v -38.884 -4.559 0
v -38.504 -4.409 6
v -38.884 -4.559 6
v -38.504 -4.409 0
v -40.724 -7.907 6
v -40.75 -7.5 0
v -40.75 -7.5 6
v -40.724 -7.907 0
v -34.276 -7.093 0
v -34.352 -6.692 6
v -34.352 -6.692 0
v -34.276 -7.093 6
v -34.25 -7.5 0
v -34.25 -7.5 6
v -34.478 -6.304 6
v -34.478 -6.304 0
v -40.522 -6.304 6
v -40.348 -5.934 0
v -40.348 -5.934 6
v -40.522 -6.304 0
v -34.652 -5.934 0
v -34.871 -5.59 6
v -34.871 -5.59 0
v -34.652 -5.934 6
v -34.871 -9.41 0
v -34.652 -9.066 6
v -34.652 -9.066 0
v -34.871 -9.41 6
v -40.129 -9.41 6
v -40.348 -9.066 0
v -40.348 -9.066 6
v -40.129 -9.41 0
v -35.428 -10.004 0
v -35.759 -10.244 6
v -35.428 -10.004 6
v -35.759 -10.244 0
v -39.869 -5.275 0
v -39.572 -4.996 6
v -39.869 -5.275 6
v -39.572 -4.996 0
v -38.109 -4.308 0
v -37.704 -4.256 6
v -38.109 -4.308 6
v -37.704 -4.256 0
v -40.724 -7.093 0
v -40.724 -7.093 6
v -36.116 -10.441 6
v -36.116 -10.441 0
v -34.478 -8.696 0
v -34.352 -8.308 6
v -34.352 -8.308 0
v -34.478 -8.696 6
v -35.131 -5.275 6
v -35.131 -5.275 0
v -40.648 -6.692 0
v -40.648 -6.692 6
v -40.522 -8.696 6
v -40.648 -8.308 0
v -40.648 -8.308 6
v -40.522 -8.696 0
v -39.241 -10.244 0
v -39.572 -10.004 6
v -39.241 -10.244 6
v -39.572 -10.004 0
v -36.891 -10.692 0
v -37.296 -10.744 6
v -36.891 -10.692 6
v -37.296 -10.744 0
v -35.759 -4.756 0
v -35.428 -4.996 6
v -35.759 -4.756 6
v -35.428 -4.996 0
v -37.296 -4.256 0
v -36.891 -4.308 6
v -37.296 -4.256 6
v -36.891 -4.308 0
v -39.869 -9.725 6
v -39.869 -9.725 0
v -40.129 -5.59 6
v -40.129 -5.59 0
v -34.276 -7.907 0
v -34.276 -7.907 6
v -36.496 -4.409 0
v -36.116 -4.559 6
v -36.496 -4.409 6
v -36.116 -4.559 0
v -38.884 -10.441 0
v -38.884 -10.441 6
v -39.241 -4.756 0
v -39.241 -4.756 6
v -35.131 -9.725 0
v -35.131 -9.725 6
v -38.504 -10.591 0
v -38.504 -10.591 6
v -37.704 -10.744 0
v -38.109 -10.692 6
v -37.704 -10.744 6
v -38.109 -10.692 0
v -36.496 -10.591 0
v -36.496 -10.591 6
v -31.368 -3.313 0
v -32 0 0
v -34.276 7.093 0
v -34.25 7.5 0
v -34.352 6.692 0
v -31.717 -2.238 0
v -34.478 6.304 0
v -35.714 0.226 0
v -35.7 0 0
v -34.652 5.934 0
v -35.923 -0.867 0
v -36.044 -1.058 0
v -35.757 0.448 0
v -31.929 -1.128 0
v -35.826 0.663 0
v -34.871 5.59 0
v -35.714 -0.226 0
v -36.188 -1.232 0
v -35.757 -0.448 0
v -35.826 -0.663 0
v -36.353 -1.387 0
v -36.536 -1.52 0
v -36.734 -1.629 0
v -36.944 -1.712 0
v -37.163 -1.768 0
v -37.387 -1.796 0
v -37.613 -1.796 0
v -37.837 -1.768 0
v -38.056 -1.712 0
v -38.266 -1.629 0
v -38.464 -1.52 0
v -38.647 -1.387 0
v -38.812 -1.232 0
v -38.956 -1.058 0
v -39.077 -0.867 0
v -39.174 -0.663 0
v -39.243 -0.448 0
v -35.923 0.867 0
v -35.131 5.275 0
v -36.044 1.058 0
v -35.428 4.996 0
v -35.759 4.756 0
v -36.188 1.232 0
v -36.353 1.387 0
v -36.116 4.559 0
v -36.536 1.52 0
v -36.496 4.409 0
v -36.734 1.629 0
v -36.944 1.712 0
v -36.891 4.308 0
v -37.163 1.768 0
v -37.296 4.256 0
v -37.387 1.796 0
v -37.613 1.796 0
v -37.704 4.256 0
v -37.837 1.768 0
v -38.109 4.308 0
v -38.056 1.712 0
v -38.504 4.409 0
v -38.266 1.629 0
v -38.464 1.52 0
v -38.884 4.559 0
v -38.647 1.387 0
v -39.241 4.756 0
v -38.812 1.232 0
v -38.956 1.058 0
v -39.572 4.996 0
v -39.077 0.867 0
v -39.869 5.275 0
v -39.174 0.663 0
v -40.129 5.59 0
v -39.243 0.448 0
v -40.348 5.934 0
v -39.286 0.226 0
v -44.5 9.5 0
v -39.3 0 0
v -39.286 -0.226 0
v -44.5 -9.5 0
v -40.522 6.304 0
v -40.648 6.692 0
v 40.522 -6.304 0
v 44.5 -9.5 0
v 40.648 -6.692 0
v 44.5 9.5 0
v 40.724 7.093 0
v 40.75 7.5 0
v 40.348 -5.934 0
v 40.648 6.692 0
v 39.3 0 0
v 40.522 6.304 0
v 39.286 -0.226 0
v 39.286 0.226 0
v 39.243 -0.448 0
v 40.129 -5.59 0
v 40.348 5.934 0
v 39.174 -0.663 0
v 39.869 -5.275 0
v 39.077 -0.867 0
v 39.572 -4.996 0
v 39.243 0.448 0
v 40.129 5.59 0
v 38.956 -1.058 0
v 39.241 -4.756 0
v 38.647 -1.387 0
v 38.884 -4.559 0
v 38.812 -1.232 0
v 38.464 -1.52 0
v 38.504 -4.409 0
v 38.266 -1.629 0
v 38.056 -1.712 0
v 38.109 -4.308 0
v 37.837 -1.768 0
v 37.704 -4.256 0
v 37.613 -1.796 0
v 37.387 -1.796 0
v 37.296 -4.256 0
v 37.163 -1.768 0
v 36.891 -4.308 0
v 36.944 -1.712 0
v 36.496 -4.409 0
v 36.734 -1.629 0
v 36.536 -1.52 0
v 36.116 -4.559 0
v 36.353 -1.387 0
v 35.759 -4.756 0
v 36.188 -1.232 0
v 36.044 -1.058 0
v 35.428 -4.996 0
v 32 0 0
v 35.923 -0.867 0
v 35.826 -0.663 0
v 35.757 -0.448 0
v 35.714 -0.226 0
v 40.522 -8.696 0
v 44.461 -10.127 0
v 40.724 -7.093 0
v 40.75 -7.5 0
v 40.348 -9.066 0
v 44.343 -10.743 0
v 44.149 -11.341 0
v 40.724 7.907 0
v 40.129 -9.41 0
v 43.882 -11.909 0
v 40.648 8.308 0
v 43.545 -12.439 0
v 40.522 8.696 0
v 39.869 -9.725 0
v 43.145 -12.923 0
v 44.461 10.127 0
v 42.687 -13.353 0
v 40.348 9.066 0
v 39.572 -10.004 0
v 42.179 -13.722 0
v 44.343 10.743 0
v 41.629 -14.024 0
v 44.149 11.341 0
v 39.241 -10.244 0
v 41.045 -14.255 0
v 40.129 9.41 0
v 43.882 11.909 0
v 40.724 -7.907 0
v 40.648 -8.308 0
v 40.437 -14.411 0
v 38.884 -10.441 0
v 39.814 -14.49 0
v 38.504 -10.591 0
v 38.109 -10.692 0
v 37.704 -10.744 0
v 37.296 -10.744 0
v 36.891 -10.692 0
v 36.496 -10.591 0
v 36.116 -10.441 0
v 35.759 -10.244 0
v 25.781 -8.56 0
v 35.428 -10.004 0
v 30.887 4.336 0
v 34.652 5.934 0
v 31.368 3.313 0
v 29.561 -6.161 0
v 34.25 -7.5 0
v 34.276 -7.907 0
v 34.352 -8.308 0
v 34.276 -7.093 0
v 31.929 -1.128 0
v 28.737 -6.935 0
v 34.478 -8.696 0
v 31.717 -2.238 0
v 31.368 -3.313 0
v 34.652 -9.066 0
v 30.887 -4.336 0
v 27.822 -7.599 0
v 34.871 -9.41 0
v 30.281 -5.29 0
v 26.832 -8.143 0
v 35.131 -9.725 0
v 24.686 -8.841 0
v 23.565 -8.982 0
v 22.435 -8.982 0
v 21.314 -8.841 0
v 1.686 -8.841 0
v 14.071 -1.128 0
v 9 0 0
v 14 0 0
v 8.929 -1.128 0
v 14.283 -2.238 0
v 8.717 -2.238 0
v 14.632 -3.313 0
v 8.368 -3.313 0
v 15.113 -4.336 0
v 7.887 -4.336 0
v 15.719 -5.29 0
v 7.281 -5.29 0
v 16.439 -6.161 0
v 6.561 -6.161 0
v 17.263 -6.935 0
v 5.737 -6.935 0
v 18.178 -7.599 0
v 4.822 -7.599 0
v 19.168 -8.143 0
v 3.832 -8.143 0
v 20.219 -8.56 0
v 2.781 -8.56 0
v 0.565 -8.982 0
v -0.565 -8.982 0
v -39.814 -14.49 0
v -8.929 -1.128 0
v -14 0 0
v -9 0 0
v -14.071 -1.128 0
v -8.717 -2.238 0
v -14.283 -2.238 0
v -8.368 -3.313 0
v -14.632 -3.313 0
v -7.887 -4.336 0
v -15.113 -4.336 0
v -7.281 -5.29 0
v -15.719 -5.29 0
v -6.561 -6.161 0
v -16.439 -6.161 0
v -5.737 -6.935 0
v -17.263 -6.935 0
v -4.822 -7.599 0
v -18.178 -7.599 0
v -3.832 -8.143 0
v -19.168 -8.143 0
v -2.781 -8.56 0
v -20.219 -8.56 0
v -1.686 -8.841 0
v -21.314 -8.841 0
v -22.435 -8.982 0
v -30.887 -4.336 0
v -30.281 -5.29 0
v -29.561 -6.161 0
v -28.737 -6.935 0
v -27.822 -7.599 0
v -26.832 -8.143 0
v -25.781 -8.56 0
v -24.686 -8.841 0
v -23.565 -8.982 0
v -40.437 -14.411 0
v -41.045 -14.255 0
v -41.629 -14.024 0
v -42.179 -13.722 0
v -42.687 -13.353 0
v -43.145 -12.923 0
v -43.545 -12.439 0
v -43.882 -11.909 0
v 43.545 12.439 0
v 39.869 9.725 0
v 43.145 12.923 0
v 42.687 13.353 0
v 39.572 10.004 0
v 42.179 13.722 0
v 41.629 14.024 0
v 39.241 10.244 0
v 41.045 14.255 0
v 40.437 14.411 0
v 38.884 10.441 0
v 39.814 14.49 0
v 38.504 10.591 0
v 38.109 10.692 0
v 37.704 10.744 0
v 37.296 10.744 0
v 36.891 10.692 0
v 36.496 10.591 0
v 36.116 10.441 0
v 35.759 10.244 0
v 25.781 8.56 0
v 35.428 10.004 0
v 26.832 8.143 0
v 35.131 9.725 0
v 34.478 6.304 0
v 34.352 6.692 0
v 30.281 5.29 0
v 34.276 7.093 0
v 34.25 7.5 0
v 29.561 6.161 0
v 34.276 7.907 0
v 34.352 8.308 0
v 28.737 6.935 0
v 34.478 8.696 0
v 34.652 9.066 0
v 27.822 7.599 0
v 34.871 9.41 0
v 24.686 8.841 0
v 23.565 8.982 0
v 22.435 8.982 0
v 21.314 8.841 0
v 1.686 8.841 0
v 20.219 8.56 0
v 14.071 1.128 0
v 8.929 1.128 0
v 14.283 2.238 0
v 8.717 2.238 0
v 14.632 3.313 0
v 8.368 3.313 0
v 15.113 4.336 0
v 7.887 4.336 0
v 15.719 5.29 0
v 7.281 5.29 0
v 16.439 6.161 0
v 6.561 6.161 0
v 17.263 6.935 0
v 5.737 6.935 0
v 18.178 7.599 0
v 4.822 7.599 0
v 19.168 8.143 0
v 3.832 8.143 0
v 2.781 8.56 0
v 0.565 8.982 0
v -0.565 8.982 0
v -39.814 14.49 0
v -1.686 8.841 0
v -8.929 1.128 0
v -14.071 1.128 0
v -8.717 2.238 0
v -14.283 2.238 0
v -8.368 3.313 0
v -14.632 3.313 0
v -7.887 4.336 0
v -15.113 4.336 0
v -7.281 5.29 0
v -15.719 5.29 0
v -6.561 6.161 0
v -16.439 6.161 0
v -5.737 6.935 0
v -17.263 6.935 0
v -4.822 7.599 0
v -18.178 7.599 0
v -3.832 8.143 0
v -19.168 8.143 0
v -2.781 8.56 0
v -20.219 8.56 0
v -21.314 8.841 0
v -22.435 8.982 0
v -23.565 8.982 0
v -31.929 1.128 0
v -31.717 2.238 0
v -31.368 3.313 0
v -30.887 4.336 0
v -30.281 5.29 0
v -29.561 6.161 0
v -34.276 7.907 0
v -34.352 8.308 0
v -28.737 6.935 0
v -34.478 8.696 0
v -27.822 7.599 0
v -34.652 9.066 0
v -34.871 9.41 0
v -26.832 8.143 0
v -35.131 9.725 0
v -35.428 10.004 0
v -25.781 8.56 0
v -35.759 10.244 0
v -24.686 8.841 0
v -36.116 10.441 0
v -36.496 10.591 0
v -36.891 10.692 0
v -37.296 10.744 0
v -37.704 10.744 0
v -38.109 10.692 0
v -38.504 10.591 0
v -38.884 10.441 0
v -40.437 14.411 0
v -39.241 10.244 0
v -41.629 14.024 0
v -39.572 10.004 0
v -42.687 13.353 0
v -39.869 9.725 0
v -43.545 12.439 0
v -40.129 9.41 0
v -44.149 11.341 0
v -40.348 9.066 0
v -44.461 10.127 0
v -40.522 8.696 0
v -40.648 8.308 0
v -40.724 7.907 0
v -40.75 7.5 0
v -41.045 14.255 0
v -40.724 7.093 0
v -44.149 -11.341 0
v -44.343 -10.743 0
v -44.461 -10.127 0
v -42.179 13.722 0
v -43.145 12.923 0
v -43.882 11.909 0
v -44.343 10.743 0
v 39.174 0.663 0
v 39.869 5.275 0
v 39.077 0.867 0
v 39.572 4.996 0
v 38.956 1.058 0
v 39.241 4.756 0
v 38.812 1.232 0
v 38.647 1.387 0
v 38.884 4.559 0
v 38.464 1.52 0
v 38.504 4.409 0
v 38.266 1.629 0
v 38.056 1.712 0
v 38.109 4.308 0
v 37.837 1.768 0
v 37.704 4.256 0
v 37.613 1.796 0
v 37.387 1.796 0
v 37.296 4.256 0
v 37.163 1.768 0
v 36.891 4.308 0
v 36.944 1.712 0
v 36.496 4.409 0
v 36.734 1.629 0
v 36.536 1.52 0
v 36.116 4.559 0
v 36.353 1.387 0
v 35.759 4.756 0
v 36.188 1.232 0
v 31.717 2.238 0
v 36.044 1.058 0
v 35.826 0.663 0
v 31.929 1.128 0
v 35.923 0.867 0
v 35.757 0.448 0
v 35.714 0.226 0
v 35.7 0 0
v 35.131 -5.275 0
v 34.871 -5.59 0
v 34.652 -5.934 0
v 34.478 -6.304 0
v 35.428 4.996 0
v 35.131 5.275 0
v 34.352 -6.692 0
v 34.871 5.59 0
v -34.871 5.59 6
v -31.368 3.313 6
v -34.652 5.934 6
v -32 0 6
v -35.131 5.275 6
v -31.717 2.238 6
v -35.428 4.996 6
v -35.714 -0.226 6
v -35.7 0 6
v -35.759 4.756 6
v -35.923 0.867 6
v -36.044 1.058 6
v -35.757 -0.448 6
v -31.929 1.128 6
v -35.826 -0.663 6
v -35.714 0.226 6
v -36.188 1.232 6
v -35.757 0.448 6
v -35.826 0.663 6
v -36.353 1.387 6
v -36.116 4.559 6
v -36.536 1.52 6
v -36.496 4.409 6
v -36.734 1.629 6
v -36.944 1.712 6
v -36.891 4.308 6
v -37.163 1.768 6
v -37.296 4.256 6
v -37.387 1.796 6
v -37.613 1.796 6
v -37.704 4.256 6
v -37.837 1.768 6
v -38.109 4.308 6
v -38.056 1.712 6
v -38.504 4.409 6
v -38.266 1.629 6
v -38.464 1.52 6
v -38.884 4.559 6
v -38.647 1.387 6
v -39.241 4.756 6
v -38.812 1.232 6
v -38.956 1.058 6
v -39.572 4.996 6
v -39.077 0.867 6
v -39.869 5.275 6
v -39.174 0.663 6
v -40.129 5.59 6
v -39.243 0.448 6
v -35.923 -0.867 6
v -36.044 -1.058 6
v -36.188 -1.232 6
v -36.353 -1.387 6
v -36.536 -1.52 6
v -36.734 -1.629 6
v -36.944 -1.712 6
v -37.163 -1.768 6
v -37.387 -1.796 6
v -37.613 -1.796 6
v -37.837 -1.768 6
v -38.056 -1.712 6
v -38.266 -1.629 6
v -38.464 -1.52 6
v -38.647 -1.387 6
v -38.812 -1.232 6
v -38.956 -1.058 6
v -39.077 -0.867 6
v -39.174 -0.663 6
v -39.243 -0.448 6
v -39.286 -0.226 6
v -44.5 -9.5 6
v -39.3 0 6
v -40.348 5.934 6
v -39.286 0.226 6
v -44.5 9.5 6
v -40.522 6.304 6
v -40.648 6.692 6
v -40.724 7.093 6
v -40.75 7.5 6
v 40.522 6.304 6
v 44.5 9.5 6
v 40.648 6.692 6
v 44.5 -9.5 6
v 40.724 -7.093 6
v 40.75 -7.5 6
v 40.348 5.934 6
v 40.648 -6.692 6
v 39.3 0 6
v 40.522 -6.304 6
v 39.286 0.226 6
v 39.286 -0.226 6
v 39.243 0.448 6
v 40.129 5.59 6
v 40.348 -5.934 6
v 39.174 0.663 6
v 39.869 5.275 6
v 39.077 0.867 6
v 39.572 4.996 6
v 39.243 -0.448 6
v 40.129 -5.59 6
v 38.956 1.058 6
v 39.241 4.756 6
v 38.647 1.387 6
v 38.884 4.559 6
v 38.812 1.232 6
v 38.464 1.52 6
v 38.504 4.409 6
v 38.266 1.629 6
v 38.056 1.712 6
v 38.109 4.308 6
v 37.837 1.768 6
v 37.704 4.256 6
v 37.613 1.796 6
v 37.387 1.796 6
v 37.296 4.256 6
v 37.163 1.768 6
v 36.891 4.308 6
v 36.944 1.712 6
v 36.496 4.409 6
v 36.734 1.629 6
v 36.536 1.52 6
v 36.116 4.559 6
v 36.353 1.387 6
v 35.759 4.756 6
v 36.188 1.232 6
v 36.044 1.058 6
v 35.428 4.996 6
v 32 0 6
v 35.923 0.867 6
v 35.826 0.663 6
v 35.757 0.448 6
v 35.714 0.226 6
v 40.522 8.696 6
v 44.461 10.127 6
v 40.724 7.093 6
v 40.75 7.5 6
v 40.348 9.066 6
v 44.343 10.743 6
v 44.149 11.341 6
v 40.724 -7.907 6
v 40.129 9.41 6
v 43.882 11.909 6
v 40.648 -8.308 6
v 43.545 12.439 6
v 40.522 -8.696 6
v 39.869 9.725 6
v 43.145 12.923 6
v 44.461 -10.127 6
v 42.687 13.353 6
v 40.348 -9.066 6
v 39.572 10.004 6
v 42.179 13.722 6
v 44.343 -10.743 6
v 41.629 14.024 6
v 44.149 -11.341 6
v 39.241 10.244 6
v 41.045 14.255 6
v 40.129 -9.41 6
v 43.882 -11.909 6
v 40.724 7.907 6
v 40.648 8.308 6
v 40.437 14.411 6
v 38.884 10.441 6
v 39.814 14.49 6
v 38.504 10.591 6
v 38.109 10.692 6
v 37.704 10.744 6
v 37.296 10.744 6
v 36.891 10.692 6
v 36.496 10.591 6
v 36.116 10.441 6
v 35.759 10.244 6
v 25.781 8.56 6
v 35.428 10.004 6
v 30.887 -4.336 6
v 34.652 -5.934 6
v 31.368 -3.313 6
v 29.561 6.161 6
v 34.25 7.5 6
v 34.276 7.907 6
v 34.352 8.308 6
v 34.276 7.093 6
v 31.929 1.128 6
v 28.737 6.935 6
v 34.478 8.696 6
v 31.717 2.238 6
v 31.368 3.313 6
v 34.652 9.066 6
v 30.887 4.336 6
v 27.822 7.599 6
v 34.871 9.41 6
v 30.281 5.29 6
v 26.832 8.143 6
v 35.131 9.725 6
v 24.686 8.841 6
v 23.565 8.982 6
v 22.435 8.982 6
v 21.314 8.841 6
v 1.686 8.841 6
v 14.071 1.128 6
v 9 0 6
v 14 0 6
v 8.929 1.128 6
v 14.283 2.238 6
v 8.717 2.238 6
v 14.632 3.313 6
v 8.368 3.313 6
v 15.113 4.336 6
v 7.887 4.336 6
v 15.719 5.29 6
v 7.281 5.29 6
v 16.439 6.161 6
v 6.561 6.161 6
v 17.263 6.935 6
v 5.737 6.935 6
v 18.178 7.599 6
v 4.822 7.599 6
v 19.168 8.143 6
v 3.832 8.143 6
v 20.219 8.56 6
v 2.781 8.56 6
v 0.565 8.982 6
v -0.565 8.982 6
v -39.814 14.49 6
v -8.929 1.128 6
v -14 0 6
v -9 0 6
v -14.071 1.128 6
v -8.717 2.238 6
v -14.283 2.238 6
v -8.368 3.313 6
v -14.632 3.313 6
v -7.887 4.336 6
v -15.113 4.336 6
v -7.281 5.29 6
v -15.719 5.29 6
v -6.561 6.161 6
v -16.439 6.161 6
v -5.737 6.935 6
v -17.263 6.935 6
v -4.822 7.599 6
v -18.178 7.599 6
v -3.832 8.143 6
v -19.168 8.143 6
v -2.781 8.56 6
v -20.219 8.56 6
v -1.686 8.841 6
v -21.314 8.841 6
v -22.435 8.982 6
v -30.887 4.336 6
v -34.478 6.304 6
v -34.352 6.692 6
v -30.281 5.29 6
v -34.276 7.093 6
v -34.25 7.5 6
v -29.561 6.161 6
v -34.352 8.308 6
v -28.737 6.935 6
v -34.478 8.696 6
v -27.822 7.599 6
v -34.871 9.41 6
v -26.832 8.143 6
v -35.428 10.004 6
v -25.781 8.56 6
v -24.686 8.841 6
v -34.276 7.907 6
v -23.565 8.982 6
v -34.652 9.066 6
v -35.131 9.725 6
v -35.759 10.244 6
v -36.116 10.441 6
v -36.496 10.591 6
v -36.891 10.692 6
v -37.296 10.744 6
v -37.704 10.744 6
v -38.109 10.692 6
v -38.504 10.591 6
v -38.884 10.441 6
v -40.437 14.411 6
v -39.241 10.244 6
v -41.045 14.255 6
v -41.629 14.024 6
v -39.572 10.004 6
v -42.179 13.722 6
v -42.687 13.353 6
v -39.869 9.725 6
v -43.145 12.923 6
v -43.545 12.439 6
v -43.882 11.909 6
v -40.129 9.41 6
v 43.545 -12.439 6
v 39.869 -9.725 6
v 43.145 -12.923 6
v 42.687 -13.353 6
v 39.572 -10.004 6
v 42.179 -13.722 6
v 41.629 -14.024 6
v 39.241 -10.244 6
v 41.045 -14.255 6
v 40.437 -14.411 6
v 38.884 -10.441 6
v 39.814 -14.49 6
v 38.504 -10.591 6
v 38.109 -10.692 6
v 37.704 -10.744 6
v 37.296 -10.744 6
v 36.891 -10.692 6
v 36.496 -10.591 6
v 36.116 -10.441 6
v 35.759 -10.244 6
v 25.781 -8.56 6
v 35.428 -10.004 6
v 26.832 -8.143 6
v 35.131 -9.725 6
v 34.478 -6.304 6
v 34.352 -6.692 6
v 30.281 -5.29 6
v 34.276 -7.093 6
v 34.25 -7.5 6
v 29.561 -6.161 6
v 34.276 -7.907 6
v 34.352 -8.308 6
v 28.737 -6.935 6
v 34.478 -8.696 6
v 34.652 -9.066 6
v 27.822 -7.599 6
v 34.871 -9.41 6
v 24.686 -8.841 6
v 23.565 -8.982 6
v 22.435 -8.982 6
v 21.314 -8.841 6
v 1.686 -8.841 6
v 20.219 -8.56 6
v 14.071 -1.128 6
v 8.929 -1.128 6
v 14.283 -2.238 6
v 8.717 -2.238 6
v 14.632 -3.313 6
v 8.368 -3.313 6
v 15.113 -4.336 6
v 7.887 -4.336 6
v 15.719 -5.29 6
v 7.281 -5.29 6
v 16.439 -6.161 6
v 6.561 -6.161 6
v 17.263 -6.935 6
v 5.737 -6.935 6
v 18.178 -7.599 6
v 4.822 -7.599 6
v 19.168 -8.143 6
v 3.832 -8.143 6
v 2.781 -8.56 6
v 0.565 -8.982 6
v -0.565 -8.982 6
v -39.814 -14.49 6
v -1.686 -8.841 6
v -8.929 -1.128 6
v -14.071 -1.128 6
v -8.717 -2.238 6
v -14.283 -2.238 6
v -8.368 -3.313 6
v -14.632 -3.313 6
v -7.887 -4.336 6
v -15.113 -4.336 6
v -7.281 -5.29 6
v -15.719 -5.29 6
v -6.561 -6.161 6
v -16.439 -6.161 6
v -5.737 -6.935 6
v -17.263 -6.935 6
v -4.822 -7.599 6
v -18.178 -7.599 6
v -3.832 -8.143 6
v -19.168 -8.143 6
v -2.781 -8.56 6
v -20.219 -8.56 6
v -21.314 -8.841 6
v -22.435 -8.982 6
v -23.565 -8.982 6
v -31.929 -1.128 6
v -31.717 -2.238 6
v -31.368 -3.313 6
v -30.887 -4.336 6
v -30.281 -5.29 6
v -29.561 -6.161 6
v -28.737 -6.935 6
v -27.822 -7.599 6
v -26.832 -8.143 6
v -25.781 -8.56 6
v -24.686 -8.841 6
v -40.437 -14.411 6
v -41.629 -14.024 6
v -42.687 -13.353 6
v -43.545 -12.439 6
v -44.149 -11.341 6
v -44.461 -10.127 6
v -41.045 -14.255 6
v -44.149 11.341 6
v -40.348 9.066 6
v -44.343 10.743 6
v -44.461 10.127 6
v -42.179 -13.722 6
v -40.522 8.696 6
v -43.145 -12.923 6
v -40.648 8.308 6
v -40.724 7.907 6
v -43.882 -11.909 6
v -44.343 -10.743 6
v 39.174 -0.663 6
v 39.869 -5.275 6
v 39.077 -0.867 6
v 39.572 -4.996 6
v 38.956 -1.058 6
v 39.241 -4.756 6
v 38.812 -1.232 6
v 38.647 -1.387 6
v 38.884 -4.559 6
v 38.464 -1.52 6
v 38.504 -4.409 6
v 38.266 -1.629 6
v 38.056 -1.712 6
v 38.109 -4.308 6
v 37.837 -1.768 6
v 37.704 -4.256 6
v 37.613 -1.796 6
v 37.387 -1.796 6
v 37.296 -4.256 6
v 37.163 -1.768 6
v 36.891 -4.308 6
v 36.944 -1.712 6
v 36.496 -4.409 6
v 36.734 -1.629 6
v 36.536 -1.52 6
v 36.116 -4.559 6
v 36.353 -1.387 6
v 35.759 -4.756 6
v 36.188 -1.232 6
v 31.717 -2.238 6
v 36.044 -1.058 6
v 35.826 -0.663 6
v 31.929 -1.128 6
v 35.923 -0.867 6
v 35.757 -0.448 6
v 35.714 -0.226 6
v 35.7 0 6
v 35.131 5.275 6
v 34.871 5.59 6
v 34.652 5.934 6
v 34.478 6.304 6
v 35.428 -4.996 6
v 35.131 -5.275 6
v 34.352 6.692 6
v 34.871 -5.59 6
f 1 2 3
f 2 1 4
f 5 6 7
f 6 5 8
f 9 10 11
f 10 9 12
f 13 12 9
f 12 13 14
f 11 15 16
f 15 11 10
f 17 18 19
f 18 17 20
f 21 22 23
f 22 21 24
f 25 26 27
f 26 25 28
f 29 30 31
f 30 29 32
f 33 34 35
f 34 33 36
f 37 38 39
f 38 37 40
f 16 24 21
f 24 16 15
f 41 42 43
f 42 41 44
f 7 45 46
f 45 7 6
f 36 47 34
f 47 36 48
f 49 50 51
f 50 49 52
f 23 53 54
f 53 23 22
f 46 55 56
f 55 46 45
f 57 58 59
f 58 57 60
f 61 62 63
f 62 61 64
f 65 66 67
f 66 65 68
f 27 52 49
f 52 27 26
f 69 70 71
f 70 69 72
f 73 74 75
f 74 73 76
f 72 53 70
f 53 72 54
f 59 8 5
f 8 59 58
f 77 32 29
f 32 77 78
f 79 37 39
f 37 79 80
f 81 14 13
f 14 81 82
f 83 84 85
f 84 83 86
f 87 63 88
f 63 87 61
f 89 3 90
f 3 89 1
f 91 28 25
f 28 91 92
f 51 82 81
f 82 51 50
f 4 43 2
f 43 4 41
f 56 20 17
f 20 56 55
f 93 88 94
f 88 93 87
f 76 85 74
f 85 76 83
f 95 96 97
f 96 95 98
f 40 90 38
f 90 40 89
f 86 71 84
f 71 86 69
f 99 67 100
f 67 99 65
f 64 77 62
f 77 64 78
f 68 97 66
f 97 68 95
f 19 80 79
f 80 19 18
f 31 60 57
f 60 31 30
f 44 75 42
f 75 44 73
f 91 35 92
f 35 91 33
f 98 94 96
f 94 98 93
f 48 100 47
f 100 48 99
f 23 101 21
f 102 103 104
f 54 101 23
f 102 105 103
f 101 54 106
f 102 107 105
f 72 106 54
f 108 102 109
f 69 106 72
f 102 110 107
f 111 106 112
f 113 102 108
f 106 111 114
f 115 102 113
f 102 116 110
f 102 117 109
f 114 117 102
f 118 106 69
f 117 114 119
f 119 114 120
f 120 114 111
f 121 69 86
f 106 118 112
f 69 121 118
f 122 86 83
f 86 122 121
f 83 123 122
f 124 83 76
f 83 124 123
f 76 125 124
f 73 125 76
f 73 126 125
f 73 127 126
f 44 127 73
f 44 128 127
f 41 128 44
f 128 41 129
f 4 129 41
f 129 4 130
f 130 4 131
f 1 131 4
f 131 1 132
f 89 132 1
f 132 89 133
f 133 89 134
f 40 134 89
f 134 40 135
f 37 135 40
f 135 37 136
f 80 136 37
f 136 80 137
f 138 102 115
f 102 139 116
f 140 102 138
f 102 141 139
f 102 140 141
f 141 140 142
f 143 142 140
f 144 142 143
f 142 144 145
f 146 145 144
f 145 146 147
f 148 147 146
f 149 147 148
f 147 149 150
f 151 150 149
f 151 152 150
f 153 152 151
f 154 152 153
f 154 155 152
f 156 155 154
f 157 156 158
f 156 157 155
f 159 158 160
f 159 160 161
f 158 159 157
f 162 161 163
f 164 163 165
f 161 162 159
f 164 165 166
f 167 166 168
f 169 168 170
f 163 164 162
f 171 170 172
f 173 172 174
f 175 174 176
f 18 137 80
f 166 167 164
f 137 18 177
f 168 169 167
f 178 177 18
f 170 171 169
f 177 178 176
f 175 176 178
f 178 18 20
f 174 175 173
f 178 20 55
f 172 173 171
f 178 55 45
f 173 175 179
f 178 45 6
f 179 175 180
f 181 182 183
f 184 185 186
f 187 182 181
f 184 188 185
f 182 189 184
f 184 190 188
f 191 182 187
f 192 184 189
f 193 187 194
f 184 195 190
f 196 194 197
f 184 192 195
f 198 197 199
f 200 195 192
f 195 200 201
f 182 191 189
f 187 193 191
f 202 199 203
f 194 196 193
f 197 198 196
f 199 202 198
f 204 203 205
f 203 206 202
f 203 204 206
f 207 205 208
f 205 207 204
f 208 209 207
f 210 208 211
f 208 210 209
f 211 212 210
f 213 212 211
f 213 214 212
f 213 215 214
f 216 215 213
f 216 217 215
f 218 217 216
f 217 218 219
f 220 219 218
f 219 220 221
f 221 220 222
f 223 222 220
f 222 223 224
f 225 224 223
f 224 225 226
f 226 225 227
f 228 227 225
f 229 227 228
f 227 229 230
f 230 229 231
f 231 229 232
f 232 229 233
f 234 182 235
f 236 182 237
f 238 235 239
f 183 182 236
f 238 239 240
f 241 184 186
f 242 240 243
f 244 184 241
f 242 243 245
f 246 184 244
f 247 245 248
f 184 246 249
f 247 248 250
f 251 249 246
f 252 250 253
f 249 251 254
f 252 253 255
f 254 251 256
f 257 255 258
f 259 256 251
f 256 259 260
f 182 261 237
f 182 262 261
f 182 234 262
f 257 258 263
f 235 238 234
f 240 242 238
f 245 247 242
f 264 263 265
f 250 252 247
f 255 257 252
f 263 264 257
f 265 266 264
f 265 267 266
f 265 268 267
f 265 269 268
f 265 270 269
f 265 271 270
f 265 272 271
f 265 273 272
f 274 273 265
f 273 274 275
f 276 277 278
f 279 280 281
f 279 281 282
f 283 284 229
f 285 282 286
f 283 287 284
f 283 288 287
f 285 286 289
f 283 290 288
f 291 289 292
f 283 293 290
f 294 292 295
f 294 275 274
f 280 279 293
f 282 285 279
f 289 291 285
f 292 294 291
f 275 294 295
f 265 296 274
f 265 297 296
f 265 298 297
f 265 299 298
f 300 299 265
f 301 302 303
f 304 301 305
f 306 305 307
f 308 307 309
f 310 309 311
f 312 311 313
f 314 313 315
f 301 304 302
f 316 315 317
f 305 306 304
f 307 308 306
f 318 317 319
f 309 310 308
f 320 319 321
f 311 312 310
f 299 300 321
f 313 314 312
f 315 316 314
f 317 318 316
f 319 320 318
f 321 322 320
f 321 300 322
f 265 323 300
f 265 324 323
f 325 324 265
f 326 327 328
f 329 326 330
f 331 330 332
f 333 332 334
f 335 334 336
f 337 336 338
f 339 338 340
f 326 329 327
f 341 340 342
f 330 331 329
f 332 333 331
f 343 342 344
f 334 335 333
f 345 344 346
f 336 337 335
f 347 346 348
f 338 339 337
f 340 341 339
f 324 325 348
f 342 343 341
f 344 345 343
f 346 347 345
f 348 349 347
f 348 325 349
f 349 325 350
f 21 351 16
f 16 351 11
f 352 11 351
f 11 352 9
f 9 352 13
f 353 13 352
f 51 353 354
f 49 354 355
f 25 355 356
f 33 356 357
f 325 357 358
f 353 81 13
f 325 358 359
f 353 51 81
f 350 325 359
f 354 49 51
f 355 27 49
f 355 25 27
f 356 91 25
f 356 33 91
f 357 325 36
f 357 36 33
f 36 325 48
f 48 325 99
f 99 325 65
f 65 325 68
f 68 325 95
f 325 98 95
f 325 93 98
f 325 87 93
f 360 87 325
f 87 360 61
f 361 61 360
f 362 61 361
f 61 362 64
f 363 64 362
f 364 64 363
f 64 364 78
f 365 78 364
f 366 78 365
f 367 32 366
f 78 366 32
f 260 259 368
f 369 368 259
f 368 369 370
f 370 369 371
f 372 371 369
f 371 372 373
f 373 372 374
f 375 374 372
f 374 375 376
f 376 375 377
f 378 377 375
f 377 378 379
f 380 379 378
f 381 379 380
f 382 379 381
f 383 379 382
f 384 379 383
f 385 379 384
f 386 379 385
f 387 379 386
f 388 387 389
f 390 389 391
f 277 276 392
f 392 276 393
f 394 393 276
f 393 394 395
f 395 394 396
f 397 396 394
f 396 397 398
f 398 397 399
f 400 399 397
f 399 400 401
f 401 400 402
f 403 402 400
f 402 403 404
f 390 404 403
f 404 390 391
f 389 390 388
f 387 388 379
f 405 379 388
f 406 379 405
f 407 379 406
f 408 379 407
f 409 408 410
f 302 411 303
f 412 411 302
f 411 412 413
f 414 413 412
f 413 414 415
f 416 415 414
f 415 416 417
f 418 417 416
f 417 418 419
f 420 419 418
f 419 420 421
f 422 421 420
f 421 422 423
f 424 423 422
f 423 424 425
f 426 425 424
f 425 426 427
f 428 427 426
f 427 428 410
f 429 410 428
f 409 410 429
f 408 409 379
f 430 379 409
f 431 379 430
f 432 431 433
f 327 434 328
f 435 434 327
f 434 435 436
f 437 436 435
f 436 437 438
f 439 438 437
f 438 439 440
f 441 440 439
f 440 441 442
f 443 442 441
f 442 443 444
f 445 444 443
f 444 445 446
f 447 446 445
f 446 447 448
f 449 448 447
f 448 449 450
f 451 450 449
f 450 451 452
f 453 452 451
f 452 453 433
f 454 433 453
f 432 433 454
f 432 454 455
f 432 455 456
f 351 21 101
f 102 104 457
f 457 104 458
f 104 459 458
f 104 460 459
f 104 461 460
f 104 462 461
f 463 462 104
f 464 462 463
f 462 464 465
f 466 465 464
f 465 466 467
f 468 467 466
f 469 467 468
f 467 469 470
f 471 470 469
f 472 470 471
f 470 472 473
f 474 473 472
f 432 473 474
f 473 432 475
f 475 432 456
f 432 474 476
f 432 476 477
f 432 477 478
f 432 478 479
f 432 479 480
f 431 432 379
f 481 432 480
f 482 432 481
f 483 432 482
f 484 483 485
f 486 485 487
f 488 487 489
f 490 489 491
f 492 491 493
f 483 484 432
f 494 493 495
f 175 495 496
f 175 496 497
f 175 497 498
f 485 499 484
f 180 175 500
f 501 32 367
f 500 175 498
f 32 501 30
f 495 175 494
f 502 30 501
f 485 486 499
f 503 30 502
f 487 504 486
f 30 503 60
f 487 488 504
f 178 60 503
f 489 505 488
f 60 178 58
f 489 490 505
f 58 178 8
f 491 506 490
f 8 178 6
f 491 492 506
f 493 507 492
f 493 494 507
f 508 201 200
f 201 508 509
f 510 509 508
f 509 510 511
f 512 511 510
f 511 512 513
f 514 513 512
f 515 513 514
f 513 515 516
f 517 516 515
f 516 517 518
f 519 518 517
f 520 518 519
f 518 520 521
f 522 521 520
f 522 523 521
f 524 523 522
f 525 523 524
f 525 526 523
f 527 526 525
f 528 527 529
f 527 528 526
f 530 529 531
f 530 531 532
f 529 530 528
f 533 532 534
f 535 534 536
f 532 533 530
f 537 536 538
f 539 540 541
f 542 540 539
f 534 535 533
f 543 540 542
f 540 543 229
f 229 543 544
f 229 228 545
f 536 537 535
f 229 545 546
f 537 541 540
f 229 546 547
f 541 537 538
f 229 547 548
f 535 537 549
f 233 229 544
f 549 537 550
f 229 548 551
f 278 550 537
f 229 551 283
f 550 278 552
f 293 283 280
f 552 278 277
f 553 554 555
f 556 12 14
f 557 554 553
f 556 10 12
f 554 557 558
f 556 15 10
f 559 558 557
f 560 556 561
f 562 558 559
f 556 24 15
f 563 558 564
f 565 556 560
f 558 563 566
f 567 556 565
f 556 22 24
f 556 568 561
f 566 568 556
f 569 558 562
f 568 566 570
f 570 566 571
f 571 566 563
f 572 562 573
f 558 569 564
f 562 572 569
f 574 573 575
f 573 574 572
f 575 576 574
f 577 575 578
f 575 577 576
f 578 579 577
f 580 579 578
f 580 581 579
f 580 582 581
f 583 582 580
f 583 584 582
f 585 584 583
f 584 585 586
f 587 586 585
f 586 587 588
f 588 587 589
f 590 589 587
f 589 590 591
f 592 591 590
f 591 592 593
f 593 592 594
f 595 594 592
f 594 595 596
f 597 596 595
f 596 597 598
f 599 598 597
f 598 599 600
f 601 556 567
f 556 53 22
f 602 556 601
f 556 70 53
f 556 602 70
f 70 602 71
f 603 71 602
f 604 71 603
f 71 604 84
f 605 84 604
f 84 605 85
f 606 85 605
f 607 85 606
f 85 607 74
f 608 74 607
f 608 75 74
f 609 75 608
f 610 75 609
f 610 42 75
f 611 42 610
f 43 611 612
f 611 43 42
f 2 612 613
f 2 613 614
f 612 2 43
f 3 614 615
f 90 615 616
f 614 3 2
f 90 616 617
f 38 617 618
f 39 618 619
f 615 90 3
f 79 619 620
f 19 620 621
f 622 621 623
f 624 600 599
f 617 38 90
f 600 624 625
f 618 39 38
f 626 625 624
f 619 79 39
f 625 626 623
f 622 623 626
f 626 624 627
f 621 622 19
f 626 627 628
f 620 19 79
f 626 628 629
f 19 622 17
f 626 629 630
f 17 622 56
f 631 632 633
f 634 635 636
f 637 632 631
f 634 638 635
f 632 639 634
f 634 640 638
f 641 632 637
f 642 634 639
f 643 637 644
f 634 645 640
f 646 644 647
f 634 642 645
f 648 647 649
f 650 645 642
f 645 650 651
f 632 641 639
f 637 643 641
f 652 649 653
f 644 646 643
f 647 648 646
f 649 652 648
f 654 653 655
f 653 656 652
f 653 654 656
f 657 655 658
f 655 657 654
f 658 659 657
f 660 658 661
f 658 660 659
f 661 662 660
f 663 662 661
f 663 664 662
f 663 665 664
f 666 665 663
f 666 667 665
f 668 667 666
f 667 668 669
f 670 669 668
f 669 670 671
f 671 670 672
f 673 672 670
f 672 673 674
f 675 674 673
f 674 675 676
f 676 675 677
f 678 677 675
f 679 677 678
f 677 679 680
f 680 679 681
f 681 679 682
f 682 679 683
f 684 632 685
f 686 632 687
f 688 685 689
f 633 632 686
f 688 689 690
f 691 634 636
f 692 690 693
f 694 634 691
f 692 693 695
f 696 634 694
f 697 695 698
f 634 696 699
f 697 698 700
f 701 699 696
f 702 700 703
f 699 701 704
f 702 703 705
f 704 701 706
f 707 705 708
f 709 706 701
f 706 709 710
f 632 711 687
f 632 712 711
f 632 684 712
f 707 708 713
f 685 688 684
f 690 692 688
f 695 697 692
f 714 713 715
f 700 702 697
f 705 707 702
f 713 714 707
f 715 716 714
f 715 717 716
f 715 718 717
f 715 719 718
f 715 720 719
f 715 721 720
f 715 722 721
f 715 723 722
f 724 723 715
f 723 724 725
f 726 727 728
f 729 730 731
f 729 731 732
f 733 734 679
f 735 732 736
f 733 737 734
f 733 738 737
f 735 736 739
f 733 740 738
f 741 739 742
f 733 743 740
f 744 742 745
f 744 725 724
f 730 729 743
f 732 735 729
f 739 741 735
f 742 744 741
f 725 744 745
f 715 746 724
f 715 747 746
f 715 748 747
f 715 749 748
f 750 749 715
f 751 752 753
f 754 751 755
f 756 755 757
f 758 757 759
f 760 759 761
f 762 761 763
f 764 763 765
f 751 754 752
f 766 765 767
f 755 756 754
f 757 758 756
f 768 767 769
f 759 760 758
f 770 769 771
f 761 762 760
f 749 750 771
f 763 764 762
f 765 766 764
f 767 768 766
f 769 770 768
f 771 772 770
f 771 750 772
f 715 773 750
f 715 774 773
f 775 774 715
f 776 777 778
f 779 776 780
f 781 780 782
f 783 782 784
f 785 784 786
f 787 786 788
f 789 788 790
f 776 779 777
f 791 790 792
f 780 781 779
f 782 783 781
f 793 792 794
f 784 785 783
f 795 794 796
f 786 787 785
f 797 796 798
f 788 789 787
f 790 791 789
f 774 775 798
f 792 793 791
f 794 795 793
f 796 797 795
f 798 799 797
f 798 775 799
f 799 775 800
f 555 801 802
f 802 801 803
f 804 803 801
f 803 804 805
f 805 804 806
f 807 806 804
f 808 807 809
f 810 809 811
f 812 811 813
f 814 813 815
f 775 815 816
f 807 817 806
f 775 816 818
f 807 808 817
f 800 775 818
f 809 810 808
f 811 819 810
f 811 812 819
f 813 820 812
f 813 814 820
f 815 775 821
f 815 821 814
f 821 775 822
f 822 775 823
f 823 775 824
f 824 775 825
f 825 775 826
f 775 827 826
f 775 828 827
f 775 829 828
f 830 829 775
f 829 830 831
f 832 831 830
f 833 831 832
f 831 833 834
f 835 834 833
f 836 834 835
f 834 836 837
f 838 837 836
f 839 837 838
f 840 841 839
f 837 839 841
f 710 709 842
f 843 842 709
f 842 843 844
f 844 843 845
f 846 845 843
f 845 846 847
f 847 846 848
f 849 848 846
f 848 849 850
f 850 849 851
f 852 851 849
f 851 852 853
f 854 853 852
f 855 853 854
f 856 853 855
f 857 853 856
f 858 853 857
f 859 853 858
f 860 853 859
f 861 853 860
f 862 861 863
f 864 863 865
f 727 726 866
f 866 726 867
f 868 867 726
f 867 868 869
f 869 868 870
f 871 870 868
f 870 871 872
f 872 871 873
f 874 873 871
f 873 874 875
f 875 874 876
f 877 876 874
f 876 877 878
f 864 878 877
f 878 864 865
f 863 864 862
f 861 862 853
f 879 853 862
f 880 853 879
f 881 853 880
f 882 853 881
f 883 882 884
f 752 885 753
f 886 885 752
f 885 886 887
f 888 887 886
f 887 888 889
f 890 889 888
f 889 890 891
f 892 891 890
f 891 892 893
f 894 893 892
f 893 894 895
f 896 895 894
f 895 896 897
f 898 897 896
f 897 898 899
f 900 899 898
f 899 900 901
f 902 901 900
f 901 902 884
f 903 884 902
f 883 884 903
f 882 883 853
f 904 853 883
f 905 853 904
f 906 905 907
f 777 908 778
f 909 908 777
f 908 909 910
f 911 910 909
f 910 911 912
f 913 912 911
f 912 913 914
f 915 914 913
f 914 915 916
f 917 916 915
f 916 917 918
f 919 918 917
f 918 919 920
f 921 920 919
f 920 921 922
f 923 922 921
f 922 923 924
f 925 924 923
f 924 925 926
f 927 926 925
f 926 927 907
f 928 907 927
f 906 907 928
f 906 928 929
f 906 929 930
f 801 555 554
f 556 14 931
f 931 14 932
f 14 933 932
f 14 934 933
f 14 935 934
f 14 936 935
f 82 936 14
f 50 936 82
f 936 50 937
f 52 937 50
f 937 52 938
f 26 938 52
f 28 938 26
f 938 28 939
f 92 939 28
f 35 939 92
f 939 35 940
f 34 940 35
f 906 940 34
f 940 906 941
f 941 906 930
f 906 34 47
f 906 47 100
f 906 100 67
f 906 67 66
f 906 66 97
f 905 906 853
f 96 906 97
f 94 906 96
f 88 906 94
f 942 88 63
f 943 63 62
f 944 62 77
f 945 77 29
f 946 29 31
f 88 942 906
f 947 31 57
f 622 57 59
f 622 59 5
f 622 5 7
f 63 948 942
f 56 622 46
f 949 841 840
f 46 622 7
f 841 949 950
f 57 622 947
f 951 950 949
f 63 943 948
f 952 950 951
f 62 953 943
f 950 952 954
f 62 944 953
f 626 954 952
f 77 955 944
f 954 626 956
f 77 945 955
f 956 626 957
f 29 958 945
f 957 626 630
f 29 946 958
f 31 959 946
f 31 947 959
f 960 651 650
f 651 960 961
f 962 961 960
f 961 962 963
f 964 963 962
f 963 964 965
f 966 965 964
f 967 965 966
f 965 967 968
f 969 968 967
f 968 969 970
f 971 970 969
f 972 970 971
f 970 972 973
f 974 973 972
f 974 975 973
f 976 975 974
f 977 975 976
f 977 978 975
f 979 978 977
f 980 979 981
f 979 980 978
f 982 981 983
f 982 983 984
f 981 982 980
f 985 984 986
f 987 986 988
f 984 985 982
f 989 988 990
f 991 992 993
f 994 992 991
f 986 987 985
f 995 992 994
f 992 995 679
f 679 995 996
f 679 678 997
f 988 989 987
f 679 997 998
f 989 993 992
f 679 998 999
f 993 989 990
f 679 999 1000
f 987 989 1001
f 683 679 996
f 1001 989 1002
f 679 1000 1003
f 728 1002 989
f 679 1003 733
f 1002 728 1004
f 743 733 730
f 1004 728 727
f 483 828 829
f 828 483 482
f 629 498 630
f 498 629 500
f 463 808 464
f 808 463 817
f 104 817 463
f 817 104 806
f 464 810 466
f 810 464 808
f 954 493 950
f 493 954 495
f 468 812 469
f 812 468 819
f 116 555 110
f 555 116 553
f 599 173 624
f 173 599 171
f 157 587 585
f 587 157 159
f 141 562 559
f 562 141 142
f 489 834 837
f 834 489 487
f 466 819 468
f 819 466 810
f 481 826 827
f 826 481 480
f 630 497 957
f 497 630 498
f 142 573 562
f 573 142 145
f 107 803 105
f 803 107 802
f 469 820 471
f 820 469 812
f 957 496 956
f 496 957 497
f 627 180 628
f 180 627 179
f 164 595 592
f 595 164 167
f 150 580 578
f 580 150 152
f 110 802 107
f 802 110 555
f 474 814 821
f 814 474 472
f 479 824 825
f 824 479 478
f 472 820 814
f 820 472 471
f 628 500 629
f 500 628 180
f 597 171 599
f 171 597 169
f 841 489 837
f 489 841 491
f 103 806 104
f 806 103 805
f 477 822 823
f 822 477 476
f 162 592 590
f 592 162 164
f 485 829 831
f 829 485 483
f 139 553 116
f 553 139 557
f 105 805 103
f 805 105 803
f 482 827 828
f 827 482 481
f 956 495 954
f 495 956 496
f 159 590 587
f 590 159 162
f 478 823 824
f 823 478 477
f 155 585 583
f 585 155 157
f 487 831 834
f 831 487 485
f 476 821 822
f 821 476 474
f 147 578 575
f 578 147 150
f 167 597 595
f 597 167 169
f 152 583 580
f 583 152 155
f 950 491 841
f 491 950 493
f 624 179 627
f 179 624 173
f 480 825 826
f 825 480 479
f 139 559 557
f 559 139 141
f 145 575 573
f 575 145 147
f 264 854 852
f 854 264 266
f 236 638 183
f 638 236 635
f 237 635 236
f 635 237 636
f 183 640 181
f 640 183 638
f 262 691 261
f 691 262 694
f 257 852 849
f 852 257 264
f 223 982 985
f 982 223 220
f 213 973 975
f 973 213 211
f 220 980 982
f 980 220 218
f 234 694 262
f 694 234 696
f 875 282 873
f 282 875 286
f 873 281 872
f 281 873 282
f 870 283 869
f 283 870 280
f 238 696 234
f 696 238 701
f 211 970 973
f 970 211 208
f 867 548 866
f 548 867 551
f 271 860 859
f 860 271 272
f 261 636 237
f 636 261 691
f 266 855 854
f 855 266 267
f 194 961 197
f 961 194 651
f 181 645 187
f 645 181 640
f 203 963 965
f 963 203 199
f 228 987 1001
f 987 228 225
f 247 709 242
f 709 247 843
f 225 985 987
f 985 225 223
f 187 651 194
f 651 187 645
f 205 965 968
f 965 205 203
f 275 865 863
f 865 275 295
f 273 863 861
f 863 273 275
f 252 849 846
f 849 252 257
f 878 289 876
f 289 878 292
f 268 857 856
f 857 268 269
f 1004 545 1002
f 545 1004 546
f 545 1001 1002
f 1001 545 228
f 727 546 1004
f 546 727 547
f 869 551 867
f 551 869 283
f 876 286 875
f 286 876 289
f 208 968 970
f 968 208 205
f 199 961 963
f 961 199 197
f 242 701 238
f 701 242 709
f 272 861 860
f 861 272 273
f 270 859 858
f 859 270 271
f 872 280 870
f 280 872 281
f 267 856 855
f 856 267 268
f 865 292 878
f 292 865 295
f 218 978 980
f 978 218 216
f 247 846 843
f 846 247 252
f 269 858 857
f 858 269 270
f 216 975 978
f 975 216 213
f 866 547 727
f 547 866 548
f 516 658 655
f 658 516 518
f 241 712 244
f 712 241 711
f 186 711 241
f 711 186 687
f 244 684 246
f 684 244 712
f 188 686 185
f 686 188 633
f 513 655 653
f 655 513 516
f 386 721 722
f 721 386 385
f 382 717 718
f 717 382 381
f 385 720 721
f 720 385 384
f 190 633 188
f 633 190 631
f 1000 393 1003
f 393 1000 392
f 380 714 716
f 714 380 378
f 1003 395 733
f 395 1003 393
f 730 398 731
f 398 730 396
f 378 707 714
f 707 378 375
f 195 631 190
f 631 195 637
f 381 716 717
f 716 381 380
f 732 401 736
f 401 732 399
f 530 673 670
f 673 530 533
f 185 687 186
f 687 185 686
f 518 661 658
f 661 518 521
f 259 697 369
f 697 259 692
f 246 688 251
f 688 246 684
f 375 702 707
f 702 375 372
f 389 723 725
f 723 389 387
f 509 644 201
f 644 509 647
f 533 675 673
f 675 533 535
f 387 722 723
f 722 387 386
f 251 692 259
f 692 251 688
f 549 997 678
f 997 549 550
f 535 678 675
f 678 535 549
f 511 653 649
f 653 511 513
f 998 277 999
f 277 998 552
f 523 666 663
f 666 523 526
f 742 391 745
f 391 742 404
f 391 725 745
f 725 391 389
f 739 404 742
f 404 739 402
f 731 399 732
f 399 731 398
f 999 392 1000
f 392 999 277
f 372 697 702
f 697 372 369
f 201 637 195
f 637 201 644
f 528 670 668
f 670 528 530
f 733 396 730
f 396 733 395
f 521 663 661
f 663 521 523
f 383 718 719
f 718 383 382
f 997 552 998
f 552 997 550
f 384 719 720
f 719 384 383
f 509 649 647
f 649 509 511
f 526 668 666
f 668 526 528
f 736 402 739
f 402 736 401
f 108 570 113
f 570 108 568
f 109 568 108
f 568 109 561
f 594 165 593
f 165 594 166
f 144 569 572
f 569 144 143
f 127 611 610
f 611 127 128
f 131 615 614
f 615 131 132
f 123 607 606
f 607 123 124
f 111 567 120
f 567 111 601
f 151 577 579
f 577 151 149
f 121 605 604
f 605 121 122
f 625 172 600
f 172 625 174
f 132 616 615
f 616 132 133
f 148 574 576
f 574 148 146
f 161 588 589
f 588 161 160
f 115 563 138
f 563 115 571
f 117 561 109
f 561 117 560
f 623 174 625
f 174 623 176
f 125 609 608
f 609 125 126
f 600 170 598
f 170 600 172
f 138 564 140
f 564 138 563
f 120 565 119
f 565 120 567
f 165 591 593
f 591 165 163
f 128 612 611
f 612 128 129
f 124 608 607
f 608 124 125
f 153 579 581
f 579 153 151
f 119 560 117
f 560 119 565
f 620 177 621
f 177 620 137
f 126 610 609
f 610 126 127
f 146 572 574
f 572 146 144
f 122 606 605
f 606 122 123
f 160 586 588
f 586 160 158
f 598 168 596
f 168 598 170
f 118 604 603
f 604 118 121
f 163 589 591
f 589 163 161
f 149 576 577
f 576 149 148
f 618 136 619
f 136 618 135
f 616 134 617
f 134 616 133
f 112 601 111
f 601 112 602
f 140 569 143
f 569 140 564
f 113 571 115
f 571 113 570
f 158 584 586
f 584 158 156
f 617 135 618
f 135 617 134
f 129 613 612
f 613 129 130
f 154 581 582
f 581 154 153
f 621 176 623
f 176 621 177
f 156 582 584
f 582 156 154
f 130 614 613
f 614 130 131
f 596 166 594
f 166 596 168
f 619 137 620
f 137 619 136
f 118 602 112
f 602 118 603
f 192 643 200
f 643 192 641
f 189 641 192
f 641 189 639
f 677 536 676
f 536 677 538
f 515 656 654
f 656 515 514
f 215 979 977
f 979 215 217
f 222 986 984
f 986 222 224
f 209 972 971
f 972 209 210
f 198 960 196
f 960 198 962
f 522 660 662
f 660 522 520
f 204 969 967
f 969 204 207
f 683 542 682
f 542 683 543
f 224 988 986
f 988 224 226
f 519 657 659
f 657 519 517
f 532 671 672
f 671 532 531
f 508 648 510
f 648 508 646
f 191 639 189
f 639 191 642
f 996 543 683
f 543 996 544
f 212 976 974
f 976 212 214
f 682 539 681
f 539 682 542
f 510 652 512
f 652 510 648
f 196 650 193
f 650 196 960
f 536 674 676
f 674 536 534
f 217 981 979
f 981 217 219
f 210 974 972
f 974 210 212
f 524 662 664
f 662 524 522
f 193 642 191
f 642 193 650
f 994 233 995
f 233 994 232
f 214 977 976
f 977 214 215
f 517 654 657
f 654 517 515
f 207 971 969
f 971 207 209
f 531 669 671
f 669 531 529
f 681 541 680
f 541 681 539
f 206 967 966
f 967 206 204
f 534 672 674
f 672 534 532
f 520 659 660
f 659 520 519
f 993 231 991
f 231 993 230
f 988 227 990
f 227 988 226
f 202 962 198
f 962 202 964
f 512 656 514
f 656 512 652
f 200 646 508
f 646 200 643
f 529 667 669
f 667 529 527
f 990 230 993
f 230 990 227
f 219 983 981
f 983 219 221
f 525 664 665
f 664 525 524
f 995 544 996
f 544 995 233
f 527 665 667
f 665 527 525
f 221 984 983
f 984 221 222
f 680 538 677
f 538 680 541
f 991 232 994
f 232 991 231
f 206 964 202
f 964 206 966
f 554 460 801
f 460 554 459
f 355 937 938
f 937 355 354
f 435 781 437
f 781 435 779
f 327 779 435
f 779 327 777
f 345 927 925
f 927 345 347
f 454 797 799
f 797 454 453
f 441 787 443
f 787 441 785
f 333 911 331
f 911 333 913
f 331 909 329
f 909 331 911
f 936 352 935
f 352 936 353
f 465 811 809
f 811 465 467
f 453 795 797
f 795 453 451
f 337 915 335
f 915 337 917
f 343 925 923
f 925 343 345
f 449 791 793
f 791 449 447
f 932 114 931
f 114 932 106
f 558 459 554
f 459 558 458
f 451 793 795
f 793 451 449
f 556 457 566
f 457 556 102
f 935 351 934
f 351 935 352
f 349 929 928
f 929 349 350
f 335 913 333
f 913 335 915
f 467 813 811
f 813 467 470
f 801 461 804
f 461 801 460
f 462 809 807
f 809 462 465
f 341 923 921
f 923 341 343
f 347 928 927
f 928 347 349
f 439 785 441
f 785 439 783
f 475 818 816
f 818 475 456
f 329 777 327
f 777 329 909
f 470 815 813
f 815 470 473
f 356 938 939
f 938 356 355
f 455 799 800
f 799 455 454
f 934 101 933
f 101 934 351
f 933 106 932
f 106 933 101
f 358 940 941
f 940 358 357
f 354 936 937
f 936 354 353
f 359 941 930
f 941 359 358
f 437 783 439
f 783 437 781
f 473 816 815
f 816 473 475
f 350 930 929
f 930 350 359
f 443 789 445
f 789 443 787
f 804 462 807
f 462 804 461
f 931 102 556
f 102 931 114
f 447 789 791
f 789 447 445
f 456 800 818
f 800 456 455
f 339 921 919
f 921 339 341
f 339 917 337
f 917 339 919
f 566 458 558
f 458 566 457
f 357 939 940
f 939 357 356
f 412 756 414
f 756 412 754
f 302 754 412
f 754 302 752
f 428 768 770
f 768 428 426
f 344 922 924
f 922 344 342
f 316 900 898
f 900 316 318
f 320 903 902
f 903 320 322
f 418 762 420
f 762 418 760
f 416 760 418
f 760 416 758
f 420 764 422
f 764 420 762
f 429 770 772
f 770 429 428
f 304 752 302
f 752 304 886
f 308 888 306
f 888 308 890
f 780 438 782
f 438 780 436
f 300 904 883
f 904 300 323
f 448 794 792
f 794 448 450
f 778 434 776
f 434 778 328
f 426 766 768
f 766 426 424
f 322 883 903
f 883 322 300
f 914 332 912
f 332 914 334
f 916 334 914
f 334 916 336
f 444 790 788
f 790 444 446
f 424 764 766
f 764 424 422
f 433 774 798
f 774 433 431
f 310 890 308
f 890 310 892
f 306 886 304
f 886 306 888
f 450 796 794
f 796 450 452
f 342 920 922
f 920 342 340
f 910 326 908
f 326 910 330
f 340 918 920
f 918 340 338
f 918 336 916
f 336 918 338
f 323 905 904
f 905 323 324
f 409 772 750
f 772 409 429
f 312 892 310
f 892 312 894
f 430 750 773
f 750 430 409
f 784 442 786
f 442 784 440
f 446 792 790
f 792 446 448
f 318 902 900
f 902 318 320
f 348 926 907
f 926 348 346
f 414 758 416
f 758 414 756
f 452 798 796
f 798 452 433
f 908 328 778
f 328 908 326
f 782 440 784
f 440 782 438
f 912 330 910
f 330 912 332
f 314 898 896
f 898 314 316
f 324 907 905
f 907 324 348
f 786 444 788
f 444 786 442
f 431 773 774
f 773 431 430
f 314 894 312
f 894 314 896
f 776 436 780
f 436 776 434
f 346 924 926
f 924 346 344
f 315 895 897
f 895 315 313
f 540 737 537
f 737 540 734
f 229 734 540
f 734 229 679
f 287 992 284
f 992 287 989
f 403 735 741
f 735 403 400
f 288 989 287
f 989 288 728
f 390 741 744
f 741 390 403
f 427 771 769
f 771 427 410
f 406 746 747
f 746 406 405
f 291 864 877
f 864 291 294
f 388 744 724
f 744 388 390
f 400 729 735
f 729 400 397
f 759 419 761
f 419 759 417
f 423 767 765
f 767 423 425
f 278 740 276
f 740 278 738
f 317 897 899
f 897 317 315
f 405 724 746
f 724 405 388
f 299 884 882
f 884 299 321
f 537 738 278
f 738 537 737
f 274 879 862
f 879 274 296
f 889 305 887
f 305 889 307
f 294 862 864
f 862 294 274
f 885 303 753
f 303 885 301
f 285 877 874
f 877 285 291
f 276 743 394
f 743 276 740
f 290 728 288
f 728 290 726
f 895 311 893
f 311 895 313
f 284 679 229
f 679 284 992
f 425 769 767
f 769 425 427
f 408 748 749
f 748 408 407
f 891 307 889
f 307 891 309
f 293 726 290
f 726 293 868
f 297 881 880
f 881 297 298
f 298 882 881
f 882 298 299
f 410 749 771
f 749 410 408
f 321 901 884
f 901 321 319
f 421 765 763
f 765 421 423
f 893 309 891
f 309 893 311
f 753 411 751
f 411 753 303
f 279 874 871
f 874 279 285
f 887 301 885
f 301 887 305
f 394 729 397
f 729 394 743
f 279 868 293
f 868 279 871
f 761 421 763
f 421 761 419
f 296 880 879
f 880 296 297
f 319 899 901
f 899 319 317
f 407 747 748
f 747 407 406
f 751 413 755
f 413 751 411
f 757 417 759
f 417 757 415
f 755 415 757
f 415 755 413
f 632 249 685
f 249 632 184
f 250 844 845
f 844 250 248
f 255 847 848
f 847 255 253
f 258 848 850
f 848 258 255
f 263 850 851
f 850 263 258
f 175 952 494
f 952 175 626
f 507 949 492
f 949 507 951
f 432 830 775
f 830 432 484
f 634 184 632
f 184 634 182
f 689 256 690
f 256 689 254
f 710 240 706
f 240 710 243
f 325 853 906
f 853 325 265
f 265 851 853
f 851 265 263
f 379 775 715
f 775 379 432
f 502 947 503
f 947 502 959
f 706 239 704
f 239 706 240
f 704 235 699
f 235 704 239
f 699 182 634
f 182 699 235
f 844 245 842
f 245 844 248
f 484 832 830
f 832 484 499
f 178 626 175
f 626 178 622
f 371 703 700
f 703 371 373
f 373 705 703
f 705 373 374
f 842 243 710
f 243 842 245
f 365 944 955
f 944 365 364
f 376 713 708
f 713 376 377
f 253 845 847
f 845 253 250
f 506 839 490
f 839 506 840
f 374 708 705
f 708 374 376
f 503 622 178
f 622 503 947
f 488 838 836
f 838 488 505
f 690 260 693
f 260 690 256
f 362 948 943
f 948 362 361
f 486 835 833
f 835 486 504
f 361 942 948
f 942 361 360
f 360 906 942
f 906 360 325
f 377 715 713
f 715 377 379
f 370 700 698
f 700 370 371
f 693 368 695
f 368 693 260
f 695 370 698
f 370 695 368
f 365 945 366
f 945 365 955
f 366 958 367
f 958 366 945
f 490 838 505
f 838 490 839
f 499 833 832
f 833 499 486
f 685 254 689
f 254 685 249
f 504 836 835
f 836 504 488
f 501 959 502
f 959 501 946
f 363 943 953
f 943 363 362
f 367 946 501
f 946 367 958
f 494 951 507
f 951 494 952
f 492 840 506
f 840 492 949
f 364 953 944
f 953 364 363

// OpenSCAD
$fn = 50;

difference() {
	union() {
		hull() {
			translate(v = [-39.5, 9.5, 0]) {
				cylinder(h = 6, r = 5);
			}
			translate(v = [39.5, 9.5, 0]) {
				cylinder(h = 6, r = 5);
			}
			translate(v = [-39.5, -9.5, 0]) {
				cylinder(h = 6, r = 5);
			}
			translate(v = [39.5, -9.5, 0]) {
				cylinder(h = 6, r = 5);
			}
		}
	}
	union() {
		translate(v = [-37.5, -7.5, 0]) {
			cylinder(h = 6, r = 3.25);
		}
		translate(v = [-37.5, 7.5, 0]) {
			cylinder(h = 6, r = 3.25);
		}
		translate(v = [37.5, -7.5, 0]) {
			cylinder(h = 6, r = 3.25);
		}
		translate(v = [37.5, 7.5, 0]) {
			cylinder(h = 6, r = 3.25);
		}
		translate(v = [-37.5, 0.0, 0]) {
			cylinder(h = 6, r = 1.8);
		}
		translate(v = [37.5, 0.0, 0]) {
			cylinder(h = 6, r = 1.8);
		}
		translate(v = [-23.0, 0, 0.0]) {
			cylinder(h = 6, r = 9.0);
		}
		cylinder(h = 6, r = 9.0);
		translate(v = [23.0, 0, 0.0]) {
			cylinder(h = 6, r = 9.0);
		}
	}
}
